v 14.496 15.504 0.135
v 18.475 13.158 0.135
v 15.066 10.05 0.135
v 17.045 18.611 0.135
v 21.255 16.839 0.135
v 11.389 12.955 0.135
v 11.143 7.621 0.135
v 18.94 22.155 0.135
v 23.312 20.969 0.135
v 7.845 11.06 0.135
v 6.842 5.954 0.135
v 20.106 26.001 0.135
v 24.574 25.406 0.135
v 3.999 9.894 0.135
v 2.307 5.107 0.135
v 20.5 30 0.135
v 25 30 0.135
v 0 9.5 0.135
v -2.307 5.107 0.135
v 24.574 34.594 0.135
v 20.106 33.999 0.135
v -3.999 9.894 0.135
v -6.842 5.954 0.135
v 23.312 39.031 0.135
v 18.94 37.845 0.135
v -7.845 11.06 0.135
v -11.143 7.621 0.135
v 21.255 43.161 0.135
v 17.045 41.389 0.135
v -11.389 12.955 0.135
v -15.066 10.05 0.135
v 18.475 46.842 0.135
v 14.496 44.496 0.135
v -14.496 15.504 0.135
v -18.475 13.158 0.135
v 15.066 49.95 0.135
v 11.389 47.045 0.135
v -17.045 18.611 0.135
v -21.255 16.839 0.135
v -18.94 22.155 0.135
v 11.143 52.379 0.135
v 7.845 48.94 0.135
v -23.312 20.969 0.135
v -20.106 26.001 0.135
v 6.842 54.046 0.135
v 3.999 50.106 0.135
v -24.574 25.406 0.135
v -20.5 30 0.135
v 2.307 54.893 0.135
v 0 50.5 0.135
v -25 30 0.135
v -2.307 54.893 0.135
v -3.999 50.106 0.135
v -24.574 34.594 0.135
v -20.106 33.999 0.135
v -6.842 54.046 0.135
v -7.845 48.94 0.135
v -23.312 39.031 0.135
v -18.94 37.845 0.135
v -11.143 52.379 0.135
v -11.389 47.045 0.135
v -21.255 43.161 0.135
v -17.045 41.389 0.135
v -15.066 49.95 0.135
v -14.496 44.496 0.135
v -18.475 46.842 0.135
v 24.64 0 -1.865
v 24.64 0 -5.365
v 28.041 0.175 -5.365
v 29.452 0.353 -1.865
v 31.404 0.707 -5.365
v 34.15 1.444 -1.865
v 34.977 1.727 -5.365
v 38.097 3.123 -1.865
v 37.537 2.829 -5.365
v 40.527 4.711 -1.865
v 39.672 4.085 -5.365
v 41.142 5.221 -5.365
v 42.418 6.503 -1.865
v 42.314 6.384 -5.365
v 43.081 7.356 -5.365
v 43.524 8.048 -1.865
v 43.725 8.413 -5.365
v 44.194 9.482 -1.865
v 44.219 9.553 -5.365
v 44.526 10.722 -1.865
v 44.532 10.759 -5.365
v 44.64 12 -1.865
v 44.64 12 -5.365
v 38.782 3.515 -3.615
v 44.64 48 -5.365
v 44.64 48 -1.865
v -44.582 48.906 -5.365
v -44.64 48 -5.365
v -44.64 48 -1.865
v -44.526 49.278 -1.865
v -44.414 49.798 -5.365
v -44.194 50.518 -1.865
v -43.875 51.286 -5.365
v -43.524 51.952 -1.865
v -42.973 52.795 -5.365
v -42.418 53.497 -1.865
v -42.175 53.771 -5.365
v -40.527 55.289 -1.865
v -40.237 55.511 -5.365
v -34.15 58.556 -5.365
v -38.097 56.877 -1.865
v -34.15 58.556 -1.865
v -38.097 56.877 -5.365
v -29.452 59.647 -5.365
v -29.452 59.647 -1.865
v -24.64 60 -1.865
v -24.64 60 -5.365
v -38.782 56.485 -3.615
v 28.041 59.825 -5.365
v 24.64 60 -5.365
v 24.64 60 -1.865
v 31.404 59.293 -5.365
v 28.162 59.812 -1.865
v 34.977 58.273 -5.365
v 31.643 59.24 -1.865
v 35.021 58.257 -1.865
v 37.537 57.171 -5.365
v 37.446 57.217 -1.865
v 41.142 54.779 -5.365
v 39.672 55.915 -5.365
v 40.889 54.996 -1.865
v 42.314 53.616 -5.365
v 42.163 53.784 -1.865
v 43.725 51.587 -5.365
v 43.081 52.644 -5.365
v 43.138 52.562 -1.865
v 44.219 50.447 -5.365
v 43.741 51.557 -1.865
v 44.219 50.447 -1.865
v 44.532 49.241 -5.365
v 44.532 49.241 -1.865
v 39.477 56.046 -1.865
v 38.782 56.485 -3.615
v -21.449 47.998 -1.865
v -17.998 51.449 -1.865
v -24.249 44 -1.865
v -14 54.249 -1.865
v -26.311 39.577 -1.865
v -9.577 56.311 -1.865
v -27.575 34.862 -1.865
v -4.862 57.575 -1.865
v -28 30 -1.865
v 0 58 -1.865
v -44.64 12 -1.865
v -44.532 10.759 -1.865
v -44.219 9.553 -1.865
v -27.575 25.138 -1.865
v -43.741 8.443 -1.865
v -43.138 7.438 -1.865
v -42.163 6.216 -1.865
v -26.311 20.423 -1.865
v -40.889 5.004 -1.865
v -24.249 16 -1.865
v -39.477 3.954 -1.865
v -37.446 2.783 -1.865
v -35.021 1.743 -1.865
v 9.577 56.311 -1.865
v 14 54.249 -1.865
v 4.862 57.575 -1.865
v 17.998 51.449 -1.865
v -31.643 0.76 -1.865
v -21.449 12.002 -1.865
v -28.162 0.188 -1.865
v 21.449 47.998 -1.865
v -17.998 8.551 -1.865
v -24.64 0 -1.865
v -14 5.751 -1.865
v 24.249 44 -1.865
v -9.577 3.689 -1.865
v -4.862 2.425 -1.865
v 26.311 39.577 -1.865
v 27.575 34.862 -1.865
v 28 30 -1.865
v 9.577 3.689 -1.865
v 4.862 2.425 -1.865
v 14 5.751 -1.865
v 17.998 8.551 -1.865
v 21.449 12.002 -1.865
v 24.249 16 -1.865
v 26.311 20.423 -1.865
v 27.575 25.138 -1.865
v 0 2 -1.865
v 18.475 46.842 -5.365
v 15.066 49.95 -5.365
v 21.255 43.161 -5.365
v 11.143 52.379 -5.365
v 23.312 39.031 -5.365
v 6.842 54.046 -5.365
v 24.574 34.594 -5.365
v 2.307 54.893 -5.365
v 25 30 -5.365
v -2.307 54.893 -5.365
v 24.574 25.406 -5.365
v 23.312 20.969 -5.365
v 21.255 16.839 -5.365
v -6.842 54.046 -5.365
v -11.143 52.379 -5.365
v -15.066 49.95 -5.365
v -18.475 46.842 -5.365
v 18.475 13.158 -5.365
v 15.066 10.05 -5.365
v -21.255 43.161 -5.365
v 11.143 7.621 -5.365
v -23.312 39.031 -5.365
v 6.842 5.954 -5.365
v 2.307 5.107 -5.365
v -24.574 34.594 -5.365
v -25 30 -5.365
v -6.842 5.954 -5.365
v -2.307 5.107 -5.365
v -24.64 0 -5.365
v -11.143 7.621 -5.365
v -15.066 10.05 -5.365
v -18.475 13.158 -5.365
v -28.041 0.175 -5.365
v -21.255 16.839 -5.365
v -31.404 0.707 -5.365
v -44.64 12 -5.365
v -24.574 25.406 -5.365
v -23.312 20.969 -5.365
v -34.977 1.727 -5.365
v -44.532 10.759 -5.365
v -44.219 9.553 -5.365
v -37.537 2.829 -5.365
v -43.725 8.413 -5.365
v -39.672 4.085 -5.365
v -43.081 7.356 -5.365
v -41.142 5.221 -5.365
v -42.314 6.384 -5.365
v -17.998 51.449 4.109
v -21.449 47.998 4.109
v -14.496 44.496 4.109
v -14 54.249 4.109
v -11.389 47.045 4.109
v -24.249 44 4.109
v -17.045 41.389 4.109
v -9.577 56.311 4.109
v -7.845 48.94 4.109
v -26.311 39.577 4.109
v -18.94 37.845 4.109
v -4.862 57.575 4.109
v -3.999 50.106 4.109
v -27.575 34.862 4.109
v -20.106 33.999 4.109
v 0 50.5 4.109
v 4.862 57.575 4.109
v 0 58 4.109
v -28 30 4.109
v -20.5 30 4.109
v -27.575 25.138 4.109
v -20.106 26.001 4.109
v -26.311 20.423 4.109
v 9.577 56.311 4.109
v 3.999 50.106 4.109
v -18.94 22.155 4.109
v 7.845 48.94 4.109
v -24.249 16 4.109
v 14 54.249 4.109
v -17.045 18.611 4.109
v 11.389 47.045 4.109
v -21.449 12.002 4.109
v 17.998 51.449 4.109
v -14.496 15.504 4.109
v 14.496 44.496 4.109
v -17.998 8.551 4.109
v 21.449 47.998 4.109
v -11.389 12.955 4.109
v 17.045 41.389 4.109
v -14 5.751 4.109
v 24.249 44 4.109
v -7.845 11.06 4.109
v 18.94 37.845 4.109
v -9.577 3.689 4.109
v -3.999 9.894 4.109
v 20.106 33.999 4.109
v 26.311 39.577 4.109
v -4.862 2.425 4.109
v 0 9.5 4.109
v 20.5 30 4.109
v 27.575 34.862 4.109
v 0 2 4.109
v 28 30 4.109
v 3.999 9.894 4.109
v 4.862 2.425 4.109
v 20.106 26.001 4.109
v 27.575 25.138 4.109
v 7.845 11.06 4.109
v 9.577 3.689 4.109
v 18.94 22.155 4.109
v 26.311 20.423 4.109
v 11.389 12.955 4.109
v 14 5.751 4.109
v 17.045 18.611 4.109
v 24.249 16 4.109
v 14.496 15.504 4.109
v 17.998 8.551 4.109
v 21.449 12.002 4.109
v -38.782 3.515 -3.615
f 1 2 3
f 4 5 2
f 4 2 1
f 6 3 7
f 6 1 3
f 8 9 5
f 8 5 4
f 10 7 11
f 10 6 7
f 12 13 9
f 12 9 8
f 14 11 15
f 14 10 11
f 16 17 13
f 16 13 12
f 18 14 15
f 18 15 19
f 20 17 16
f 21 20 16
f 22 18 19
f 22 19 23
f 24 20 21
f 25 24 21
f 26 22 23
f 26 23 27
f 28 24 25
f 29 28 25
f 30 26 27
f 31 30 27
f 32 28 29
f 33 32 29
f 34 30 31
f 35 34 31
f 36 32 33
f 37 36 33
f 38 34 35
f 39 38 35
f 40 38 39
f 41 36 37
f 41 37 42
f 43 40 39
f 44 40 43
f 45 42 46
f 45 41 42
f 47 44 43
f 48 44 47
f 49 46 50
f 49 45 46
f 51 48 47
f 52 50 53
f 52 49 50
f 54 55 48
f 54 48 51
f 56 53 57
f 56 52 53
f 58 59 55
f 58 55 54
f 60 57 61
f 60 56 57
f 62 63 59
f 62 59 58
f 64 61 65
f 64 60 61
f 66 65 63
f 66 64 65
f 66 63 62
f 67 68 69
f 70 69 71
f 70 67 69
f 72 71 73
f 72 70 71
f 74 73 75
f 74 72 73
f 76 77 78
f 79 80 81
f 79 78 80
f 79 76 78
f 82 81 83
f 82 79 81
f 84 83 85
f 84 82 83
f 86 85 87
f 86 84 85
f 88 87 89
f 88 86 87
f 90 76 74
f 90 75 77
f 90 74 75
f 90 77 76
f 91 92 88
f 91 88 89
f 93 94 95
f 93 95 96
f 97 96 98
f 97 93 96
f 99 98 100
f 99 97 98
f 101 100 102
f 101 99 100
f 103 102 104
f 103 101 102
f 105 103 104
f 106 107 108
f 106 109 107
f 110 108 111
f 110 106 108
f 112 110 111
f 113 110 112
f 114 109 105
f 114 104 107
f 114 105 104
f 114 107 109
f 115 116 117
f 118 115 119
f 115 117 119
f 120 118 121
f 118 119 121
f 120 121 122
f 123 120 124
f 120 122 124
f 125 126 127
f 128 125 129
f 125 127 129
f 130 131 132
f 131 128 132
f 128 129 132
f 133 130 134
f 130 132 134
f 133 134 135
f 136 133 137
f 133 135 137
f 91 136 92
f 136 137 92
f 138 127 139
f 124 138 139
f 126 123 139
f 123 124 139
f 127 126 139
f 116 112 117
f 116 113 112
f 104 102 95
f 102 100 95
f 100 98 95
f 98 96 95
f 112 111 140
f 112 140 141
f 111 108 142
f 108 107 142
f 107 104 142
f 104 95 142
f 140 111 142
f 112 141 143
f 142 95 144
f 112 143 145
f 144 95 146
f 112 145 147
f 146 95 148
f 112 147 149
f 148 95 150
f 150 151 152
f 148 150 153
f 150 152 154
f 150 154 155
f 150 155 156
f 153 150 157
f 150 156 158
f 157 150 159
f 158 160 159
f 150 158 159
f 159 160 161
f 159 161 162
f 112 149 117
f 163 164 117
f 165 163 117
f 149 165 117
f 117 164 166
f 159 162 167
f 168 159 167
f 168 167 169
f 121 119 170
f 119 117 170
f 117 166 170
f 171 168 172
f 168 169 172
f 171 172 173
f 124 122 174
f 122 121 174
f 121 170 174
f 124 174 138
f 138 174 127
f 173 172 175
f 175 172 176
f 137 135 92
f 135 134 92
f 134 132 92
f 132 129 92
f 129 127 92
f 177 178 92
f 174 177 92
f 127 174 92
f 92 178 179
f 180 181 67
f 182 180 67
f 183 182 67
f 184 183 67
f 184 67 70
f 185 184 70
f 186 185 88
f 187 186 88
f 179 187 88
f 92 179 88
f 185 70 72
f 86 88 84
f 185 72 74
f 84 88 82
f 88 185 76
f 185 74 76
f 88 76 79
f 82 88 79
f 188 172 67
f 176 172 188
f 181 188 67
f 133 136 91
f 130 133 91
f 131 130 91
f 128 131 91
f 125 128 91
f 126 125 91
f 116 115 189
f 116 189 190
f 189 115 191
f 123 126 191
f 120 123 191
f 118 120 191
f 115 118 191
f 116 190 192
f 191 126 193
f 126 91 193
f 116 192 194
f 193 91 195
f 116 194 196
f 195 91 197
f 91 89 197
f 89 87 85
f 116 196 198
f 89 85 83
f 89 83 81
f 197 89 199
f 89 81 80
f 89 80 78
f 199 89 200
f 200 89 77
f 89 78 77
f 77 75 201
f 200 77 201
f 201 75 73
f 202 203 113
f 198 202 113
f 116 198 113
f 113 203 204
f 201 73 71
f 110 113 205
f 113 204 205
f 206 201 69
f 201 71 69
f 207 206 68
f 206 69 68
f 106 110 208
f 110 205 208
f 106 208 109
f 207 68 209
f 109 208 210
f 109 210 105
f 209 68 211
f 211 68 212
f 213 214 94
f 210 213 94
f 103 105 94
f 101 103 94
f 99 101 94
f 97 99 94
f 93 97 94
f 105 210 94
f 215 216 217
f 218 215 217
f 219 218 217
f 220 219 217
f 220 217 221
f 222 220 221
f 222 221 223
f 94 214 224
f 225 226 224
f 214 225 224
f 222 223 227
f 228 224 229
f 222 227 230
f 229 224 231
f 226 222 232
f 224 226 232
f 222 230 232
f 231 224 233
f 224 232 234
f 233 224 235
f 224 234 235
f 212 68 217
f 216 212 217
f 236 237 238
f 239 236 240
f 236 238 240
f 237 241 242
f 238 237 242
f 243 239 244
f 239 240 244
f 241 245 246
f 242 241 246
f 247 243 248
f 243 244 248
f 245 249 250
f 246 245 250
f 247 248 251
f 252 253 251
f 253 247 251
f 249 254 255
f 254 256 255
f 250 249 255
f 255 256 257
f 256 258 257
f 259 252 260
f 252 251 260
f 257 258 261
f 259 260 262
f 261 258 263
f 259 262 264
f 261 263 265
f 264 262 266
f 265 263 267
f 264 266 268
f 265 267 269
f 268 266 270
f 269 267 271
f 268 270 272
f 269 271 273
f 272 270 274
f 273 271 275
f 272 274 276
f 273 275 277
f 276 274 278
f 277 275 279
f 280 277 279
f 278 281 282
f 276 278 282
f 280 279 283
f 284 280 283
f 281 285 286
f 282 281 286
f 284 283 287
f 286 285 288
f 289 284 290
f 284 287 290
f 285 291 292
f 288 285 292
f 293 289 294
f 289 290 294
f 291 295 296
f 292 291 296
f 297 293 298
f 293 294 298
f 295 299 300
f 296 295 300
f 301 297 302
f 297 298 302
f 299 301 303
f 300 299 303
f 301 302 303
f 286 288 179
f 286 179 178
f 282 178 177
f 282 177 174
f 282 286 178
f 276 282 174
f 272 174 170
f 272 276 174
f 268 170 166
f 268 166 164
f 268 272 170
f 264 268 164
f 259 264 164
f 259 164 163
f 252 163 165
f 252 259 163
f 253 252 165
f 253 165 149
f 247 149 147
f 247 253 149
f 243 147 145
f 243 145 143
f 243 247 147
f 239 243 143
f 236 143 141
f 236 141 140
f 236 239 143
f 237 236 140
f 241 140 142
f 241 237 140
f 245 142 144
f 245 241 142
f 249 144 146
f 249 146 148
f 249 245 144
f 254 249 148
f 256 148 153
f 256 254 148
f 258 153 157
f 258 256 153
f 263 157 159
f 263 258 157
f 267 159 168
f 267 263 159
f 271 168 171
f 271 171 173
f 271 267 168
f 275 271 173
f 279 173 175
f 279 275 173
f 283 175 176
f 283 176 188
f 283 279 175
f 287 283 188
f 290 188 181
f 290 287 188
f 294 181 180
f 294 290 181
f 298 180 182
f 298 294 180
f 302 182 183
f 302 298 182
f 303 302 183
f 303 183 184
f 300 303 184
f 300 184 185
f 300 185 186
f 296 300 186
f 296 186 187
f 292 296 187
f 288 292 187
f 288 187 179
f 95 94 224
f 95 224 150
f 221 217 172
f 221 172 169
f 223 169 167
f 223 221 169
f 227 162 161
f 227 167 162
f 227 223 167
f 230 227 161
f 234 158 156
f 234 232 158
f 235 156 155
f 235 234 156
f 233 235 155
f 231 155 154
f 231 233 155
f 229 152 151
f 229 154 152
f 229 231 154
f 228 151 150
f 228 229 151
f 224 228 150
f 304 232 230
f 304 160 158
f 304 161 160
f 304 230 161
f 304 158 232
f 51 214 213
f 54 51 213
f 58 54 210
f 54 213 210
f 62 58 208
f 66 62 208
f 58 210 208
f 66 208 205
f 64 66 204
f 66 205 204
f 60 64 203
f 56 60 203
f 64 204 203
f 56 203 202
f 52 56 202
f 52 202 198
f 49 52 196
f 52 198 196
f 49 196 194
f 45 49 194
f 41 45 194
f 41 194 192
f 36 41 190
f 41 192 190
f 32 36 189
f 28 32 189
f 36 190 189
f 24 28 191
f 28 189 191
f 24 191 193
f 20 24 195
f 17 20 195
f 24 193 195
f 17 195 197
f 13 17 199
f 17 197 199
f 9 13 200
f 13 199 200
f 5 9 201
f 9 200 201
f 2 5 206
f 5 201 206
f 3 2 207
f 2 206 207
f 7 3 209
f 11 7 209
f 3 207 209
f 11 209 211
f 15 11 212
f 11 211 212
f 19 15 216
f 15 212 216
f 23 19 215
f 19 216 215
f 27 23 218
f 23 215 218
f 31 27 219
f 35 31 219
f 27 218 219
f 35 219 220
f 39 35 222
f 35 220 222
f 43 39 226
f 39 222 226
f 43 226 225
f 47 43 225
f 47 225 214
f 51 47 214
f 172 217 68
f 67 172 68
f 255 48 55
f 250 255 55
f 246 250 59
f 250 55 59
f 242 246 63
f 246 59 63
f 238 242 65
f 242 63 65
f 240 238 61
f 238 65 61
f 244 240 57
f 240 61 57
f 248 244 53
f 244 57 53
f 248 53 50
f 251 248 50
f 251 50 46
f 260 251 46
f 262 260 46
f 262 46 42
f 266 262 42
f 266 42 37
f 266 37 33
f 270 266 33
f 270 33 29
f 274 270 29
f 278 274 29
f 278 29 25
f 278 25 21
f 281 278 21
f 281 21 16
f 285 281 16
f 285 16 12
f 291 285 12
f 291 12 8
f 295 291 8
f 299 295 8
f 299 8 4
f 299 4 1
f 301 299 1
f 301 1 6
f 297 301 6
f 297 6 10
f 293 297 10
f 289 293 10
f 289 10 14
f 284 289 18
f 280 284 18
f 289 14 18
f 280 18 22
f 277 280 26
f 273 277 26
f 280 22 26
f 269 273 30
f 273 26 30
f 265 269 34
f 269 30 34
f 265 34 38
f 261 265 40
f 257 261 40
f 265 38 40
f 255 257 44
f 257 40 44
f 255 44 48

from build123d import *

# Parameters (mm, degrees)
BOSS_EXTRUDE1_DEPTH = 60
SKETCH2_R           = 25
CUT_EXTRUDE1_DEPTH  = 5.5
FILLET1_SIZE        = 12
FILLET1_SIZE_2      = 20
FILLET2_SIZE        = 20
FILLET2_SIZE_2      = 12
FILLET3_SIZE        = 20
FILLET3_SIZE_2      = 12
SKETCH4_R           = 20.5
CUT_EXTRUDE2_DEPTH  = 8.5
SKETCH6_R           = 28
CUT_EXTRUDE3_DEPTH  = 5.973425633


with BuildPart() as part:
    # Sketch1 → Boss-Extrude1 (new body)
    with BuildSketch(Plane(origin=(0, 0, 0), x_dir=(1, 0, 0), z_dir=(0, 1, 0))):
        Polygon((-44.639505024, 1.864709672), (-31.939505024, 1.864709672), (-31.939505024, -4.108715961), (31.939505024, -4.108715961), (31.939505024, 1.864709672), (44.639505024, 1.864709672), (44.639505024, 5.364709672), (-44.639505024, 5.364709672), align=None)
    extrude(amount=BOSS_EXTRUDE1_DEPTH)

    # Sketch2 → Cut-Extrude1 (cut)
    with BuildSketch(Plane(origin=(0, 0, -5.364709672), x_dir=(-1, 0, 0), z_dir=(0, 0, -1))):
        with Locations((0, 30)):
            Circle(SKETCH2_R)
    extrude(amount=-CUT_EXTRUDE1_DEPTH, mode=Mode.SUBTRACT)

    # Fillet1
    # an asymmetric fillet: 20, 12 mm, written as the material it takes off along each edge
    with BuildSketch(Plane(origin=(-44.639505024, 60, -55.364709672), x_dir=(0, -1, 0), z_dir=(0, 0, 1))) as fillet1_piece_1:
        with BuildLine():
            Bezier((FILLET1_SIZE, 0), (0, 0), (0, FILLET1_SIZE_2), weights=[1, 0.707106781, 1])
            Line((0, FILLET1_SIZE_2), (0, 0))
            Line((0, 0), (FILLET1_SIZE, 0))
        make_face()
    extrude(amount=103.5, mode=Mode.SUBTRACT)
    with BuildSketch(Plane(origin=(44.639505024, 60, 48.135290328), x_dir=(-1, 0, 0), z_dir=(0, 0, -1))) as fillet1_piece_2:
        with BuildLine():
            Bezier((FILLET1_SIZE_2, 0), (0, 0), (0, -FILLET1_SIZE), weights=[1, 0.707106781, 1])
            Line((0, -FILLET1_SIZE), (0, 0))
            Line((0, 0), (FILLET1_SIZE_2, 0))
        make_face()
    extrude(amount=103.5, mode=Mode.SUBTRACT)

    # Fillet2
    # an asymmetric fillet: 20, 12 mm, written as the material it takes off along each edge
    with BuildSketch(Plane(origin=(44.639505024, 0, 48.135290328), x_dir=(-1, 0, 0), z_dir=(0, 0, -1))) as fillet2_piece_1:
        with BuildLine():
            Bezier((FILLET2_SIZE, 0), (0, 0), (0, FILLET2_SIZE_2), weights=[1, 0.707106781, 1])
            Line((0, FILLET2_SIZE_2), (0, 0))
            Line((0, 0), (FILLET2_SIZE, 0))
        make_face()
    extrude(amount=103.5, mode=Mode.SUBTRACT)

    # Fillet3
    # an asymmetric fillet: 20, 12 mm, written as the material it takes off along each edge
    with BuildSketch(Plane(origin=(-44.639505024, 0, -55.364709672), x_dir=(1, 0, 0), z_dir=(0, 0, 1))) as fillet3_piece_1:
        with BuildLine():
            Bezier((FILLET3_SIZE, 0), (0, 0), (0, FILLET3_SIZE_2), weights=[1, 0.707106781, 1])
            Line((0, FILLET3_SIZE_2), (0, 0))
            Line((0, 0), (FILLET3_SIZE, 0))
        make_face()
    extrude(amount=103.5, mode=Mode.SUBTRACT)

    # Sketch4 → Cut-Extrude2 (cut)
    with BuildSketch(Plane(origin=(0, 0, 0.135290328), x_dir=(-1, 0, 0), z_dir=(0, 0, -1))):
        with Locations((0, 30)):
            Circle(SKETCH4_R)
    extrude(amount=-CUT_EXTRUDE2_DEPTH, mode=Mode.SUBTRACT)

    # Sketch6 → Cut-Extrude3 (cut)
    with BuildSketch(Plane.XY.offset(4.108715961)):
        with BuildLine():
            Line((-31.939505024, 59.172090225), (-31.939505024, 0.827909775))
            add(Edge.make_bspline(
                [(-31.939505024, 0.827909775), (-28.419914948, -2e-09), (-24.63950501, 0)],
                knots=[0, 0, 0, 1, 1, 1], degree=2))
            Line((-24.63950501, 0), (24.639505024, 0))
            add(Edge.make_bspline(
                [(24.639505024, 0), (28.419914955, 0), (31.939505024, 0.827909775)],
                knots=[0, 0, 0, 1, 1, 1], degree=2))
            Line((31.939505024, 0.827909775), (31.939505024, 59.172090225))
            add(Edge.make_bspline(
                [(31.939505024, 59.172090225), (28.419914948, 60.000000002), (24.63950501, 60)],
                knots=[0, 0, 0, 1, 1, 1], degree=2))
            Line((24.63950501, 60), (-24.639505024, 60))
            add(Edge.make_bspline(
                [(-24.639505024, 60), (-28.419914955, 60), (-31.939505024, 59.172090225)],
                knots=[0, 0, 0, 1, 1, 1], degree=2))
        make_face()
        with Locations((0, 30)):
            Circle(SKETCH6_R, mode=Mode.SUBTRACT)
    extrude(amount=-CUT_EXTRUDE3_DEPTH, mode=Mode.SUBTRACT)


solid = part.part
